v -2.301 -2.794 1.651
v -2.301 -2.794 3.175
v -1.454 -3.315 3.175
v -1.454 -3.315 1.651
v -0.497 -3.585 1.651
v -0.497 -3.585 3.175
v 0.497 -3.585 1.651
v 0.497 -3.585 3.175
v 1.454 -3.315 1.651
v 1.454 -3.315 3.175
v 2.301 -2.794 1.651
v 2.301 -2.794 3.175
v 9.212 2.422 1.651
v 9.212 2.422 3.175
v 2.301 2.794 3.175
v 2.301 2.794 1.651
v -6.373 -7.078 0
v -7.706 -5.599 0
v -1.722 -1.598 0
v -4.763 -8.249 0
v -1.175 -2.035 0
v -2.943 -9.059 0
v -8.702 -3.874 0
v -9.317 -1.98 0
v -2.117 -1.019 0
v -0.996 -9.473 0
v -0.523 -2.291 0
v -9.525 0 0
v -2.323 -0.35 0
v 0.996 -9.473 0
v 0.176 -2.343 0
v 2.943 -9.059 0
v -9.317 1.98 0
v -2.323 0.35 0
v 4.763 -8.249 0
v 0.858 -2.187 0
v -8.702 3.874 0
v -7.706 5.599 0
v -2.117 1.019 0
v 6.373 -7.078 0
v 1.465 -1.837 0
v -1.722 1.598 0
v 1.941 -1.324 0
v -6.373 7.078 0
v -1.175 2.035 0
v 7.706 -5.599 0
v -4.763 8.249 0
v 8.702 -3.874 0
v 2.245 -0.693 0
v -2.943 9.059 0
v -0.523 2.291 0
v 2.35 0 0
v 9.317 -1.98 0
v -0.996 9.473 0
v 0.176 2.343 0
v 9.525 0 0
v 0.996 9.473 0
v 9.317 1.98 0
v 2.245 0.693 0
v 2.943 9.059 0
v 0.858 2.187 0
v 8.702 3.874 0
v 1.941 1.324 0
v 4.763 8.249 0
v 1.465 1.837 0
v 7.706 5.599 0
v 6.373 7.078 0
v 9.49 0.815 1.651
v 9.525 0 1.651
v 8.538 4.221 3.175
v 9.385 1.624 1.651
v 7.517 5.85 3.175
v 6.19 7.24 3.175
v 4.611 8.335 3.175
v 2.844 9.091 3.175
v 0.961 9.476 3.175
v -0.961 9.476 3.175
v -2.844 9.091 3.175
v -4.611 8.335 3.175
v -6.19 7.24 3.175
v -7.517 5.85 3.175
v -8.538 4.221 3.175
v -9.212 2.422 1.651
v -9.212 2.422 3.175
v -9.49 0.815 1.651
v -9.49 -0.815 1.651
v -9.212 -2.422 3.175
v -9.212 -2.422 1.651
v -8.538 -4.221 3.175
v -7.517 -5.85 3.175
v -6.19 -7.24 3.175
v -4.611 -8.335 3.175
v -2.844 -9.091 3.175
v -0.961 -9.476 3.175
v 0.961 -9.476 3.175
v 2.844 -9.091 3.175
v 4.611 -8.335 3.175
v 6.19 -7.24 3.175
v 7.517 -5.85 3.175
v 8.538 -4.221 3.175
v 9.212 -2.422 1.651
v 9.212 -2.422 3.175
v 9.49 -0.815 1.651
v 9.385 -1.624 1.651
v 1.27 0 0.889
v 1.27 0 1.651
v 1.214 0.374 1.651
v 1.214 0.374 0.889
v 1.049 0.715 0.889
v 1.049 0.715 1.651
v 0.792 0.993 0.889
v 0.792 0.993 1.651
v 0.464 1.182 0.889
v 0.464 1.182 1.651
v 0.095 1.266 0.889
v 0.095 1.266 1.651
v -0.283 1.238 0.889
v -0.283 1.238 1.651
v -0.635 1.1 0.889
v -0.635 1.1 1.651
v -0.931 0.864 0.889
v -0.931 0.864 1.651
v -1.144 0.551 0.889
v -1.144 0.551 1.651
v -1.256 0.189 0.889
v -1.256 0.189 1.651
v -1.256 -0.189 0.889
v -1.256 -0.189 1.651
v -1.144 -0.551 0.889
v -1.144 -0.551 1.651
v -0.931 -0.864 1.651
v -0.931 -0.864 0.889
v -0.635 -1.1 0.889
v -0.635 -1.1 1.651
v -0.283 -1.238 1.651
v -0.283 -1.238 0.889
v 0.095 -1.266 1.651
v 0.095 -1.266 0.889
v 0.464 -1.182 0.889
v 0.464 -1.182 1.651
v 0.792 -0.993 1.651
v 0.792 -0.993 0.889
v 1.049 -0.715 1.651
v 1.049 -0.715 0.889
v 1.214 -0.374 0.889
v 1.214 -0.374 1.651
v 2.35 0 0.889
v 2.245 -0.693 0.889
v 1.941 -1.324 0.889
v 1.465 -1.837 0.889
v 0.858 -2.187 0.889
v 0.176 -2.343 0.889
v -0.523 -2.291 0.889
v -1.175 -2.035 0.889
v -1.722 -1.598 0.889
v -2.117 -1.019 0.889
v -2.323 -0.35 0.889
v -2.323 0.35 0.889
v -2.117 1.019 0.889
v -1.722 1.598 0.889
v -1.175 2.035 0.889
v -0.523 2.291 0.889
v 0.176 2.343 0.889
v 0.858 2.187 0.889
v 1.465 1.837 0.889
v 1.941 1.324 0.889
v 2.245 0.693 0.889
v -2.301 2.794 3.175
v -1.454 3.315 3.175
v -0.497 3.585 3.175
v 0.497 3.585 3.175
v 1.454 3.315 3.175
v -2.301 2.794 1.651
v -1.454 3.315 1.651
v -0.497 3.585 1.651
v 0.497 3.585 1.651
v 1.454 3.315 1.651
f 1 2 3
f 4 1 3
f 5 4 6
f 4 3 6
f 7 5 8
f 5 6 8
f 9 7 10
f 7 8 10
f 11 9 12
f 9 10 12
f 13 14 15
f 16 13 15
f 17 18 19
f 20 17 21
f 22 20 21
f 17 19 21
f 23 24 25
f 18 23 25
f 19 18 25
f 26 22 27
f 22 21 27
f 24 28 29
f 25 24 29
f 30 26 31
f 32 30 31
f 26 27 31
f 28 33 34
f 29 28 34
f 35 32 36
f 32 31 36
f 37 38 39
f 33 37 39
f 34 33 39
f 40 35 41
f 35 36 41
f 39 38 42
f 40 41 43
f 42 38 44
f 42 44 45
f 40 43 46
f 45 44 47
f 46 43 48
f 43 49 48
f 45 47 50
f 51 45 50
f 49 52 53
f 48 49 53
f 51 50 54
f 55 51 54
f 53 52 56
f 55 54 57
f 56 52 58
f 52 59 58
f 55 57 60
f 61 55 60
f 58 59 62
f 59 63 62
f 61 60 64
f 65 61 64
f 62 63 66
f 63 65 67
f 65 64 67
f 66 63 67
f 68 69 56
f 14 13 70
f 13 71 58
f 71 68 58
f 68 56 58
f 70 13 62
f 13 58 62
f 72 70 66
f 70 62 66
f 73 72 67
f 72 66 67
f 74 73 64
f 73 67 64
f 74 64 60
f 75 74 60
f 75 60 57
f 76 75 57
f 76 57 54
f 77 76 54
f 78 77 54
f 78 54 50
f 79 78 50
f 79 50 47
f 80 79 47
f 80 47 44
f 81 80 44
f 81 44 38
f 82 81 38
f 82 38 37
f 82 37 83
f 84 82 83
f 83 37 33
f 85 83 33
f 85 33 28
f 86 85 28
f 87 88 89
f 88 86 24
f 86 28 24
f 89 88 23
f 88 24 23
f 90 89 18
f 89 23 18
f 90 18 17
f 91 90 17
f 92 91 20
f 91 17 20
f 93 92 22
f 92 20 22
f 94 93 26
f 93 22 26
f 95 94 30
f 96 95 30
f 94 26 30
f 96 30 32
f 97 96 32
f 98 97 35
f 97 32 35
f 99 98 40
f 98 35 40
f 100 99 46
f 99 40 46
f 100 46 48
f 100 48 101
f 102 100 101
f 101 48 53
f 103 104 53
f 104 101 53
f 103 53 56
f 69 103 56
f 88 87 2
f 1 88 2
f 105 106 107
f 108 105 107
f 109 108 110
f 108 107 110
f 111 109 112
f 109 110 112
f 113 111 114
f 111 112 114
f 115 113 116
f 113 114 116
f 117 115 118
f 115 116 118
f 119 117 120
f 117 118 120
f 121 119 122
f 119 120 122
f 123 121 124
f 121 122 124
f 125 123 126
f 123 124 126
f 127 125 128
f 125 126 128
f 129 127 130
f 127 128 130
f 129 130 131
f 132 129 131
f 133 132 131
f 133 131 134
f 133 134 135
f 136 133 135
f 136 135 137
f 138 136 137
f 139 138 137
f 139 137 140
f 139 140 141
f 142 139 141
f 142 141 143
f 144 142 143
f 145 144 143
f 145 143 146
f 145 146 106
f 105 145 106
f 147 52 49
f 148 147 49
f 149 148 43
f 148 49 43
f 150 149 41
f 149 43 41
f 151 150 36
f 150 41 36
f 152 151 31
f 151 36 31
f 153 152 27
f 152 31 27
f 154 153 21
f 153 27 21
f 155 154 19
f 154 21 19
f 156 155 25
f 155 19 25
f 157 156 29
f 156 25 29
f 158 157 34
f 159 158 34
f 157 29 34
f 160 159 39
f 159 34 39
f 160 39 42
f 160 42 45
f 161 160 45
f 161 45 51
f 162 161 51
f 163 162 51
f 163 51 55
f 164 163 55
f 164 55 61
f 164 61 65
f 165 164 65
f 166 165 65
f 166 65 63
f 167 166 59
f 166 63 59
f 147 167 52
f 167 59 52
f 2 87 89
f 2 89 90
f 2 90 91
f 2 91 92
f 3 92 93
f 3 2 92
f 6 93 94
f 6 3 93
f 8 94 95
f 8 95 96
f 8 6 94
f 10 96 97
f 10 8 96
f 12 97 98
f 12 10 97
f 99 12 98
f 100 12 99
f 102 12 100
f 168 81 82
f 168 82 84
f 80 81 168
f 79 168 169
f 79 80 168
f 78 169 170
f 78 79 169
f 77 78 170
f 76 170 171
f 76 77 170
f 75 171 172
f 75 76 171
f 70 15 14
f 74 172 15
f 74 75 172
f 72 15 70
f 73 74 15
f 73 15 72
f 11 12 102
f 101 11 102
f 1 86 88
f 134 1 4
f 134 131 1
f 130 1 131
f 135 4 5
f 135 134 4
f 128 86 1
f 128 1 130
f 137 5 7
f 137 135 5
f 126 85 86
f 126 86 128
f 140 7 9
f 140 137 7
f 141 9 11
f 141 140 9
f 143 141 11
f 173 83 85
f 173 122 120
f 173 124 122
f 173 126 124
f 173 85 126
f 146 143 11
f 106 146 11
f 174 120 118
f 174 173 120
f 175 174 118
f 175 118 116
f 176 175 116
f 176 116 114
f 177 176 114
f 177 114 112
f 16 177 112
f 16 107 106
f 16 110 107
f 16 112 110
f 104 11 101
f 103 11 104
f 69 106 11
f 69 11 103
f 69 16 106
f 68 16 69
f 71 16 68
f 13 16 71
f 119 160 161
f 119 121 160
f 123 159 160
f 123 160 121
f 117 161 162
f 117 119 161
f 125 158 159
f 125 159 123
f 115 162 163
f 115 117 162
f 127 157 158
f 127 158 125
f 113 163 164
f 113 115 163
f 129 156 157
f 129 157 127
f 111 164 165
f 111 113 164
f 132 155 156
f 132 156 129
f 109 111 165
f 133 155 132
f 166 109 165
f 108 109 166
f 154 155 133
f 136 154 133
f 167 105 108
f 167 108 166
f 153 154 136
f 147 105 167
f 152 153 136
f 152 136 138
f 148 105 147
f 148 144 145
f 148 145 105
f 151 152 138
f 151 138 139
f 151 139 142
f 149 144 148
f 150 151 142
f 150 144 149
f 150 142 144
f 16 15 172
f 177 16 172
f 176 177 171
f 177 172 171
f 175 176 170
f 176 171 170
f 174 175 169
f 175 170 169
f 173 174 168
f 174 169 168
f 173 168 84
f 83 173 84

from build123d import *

# Parameters (mm, degrees)
F0_R     = 9.525
F1_DEPTH = 3.175
F3_DEPTH = 1.524
F4_R     = 1.27
F5_DEPTH = 25.4
F6_R     = 2.3495
F7_DEPTH = 0.889


with BuildPart() as f1:
    # F0 (on Top) → F1 (new body)
    with BuildSketch(Plane.XY):
        Circle(F0_R)
    extrude(amount=F1_DEPTH)

    # F2 (on face) → F3 (cut)
    with BuildSketch(Plane.XY.offset(3.175)):
        with BuildLine():
            Line((2.3009442084, -2.794), (14.0832249425, -2.159))
            ThreePointArc((14.0832249425, -2.159), (16.129, 0), (14.0832249425, 2.159))
            Line((14.0832249425, 2.159), (2.3009442084, 2.794))
            ThreePointArc((2.3009442084, 2.794), (0, 3.6195), (-2.3009442084, 2.794))
            Line((-2.3009442084, 2.794), (-14.0832249425, 2.159))
            ThreePointArc((-14.0832249425, 2.159), (-16.129, 0), (-14.0832249425, -2.159))
            Line((-14.0832249425, -2.159), (-2.3009442084, -2.794))
            ThreePointArc((-2.3009442084, -2.794), (0, -3.6195), (2.3009442084, -2.794))
        make_face()
    extrude(amount=-F3_DEPTH, mode=Mode.SUBTRACT)

    # F4 (on face) → F5 (cut)
    with BuildSketch(Plane.XY.offset(1.651)):
        Circle(F4_R)
    extrude(amount=-F5_DEPTH, mode=Mode.SUBTRACT)

    # F6 (on face) → F7 (cut, through all)
    with BuildSketch(Plane(origin=(0, 0, 0), x_dir=(1, 0, 0), z_dir=(0, 0, -1))):
        Circle(F6_R)
    extrude(amount=-F7_DEPTH, mode=Mode.SUBTRACT)


solid = f1.part
